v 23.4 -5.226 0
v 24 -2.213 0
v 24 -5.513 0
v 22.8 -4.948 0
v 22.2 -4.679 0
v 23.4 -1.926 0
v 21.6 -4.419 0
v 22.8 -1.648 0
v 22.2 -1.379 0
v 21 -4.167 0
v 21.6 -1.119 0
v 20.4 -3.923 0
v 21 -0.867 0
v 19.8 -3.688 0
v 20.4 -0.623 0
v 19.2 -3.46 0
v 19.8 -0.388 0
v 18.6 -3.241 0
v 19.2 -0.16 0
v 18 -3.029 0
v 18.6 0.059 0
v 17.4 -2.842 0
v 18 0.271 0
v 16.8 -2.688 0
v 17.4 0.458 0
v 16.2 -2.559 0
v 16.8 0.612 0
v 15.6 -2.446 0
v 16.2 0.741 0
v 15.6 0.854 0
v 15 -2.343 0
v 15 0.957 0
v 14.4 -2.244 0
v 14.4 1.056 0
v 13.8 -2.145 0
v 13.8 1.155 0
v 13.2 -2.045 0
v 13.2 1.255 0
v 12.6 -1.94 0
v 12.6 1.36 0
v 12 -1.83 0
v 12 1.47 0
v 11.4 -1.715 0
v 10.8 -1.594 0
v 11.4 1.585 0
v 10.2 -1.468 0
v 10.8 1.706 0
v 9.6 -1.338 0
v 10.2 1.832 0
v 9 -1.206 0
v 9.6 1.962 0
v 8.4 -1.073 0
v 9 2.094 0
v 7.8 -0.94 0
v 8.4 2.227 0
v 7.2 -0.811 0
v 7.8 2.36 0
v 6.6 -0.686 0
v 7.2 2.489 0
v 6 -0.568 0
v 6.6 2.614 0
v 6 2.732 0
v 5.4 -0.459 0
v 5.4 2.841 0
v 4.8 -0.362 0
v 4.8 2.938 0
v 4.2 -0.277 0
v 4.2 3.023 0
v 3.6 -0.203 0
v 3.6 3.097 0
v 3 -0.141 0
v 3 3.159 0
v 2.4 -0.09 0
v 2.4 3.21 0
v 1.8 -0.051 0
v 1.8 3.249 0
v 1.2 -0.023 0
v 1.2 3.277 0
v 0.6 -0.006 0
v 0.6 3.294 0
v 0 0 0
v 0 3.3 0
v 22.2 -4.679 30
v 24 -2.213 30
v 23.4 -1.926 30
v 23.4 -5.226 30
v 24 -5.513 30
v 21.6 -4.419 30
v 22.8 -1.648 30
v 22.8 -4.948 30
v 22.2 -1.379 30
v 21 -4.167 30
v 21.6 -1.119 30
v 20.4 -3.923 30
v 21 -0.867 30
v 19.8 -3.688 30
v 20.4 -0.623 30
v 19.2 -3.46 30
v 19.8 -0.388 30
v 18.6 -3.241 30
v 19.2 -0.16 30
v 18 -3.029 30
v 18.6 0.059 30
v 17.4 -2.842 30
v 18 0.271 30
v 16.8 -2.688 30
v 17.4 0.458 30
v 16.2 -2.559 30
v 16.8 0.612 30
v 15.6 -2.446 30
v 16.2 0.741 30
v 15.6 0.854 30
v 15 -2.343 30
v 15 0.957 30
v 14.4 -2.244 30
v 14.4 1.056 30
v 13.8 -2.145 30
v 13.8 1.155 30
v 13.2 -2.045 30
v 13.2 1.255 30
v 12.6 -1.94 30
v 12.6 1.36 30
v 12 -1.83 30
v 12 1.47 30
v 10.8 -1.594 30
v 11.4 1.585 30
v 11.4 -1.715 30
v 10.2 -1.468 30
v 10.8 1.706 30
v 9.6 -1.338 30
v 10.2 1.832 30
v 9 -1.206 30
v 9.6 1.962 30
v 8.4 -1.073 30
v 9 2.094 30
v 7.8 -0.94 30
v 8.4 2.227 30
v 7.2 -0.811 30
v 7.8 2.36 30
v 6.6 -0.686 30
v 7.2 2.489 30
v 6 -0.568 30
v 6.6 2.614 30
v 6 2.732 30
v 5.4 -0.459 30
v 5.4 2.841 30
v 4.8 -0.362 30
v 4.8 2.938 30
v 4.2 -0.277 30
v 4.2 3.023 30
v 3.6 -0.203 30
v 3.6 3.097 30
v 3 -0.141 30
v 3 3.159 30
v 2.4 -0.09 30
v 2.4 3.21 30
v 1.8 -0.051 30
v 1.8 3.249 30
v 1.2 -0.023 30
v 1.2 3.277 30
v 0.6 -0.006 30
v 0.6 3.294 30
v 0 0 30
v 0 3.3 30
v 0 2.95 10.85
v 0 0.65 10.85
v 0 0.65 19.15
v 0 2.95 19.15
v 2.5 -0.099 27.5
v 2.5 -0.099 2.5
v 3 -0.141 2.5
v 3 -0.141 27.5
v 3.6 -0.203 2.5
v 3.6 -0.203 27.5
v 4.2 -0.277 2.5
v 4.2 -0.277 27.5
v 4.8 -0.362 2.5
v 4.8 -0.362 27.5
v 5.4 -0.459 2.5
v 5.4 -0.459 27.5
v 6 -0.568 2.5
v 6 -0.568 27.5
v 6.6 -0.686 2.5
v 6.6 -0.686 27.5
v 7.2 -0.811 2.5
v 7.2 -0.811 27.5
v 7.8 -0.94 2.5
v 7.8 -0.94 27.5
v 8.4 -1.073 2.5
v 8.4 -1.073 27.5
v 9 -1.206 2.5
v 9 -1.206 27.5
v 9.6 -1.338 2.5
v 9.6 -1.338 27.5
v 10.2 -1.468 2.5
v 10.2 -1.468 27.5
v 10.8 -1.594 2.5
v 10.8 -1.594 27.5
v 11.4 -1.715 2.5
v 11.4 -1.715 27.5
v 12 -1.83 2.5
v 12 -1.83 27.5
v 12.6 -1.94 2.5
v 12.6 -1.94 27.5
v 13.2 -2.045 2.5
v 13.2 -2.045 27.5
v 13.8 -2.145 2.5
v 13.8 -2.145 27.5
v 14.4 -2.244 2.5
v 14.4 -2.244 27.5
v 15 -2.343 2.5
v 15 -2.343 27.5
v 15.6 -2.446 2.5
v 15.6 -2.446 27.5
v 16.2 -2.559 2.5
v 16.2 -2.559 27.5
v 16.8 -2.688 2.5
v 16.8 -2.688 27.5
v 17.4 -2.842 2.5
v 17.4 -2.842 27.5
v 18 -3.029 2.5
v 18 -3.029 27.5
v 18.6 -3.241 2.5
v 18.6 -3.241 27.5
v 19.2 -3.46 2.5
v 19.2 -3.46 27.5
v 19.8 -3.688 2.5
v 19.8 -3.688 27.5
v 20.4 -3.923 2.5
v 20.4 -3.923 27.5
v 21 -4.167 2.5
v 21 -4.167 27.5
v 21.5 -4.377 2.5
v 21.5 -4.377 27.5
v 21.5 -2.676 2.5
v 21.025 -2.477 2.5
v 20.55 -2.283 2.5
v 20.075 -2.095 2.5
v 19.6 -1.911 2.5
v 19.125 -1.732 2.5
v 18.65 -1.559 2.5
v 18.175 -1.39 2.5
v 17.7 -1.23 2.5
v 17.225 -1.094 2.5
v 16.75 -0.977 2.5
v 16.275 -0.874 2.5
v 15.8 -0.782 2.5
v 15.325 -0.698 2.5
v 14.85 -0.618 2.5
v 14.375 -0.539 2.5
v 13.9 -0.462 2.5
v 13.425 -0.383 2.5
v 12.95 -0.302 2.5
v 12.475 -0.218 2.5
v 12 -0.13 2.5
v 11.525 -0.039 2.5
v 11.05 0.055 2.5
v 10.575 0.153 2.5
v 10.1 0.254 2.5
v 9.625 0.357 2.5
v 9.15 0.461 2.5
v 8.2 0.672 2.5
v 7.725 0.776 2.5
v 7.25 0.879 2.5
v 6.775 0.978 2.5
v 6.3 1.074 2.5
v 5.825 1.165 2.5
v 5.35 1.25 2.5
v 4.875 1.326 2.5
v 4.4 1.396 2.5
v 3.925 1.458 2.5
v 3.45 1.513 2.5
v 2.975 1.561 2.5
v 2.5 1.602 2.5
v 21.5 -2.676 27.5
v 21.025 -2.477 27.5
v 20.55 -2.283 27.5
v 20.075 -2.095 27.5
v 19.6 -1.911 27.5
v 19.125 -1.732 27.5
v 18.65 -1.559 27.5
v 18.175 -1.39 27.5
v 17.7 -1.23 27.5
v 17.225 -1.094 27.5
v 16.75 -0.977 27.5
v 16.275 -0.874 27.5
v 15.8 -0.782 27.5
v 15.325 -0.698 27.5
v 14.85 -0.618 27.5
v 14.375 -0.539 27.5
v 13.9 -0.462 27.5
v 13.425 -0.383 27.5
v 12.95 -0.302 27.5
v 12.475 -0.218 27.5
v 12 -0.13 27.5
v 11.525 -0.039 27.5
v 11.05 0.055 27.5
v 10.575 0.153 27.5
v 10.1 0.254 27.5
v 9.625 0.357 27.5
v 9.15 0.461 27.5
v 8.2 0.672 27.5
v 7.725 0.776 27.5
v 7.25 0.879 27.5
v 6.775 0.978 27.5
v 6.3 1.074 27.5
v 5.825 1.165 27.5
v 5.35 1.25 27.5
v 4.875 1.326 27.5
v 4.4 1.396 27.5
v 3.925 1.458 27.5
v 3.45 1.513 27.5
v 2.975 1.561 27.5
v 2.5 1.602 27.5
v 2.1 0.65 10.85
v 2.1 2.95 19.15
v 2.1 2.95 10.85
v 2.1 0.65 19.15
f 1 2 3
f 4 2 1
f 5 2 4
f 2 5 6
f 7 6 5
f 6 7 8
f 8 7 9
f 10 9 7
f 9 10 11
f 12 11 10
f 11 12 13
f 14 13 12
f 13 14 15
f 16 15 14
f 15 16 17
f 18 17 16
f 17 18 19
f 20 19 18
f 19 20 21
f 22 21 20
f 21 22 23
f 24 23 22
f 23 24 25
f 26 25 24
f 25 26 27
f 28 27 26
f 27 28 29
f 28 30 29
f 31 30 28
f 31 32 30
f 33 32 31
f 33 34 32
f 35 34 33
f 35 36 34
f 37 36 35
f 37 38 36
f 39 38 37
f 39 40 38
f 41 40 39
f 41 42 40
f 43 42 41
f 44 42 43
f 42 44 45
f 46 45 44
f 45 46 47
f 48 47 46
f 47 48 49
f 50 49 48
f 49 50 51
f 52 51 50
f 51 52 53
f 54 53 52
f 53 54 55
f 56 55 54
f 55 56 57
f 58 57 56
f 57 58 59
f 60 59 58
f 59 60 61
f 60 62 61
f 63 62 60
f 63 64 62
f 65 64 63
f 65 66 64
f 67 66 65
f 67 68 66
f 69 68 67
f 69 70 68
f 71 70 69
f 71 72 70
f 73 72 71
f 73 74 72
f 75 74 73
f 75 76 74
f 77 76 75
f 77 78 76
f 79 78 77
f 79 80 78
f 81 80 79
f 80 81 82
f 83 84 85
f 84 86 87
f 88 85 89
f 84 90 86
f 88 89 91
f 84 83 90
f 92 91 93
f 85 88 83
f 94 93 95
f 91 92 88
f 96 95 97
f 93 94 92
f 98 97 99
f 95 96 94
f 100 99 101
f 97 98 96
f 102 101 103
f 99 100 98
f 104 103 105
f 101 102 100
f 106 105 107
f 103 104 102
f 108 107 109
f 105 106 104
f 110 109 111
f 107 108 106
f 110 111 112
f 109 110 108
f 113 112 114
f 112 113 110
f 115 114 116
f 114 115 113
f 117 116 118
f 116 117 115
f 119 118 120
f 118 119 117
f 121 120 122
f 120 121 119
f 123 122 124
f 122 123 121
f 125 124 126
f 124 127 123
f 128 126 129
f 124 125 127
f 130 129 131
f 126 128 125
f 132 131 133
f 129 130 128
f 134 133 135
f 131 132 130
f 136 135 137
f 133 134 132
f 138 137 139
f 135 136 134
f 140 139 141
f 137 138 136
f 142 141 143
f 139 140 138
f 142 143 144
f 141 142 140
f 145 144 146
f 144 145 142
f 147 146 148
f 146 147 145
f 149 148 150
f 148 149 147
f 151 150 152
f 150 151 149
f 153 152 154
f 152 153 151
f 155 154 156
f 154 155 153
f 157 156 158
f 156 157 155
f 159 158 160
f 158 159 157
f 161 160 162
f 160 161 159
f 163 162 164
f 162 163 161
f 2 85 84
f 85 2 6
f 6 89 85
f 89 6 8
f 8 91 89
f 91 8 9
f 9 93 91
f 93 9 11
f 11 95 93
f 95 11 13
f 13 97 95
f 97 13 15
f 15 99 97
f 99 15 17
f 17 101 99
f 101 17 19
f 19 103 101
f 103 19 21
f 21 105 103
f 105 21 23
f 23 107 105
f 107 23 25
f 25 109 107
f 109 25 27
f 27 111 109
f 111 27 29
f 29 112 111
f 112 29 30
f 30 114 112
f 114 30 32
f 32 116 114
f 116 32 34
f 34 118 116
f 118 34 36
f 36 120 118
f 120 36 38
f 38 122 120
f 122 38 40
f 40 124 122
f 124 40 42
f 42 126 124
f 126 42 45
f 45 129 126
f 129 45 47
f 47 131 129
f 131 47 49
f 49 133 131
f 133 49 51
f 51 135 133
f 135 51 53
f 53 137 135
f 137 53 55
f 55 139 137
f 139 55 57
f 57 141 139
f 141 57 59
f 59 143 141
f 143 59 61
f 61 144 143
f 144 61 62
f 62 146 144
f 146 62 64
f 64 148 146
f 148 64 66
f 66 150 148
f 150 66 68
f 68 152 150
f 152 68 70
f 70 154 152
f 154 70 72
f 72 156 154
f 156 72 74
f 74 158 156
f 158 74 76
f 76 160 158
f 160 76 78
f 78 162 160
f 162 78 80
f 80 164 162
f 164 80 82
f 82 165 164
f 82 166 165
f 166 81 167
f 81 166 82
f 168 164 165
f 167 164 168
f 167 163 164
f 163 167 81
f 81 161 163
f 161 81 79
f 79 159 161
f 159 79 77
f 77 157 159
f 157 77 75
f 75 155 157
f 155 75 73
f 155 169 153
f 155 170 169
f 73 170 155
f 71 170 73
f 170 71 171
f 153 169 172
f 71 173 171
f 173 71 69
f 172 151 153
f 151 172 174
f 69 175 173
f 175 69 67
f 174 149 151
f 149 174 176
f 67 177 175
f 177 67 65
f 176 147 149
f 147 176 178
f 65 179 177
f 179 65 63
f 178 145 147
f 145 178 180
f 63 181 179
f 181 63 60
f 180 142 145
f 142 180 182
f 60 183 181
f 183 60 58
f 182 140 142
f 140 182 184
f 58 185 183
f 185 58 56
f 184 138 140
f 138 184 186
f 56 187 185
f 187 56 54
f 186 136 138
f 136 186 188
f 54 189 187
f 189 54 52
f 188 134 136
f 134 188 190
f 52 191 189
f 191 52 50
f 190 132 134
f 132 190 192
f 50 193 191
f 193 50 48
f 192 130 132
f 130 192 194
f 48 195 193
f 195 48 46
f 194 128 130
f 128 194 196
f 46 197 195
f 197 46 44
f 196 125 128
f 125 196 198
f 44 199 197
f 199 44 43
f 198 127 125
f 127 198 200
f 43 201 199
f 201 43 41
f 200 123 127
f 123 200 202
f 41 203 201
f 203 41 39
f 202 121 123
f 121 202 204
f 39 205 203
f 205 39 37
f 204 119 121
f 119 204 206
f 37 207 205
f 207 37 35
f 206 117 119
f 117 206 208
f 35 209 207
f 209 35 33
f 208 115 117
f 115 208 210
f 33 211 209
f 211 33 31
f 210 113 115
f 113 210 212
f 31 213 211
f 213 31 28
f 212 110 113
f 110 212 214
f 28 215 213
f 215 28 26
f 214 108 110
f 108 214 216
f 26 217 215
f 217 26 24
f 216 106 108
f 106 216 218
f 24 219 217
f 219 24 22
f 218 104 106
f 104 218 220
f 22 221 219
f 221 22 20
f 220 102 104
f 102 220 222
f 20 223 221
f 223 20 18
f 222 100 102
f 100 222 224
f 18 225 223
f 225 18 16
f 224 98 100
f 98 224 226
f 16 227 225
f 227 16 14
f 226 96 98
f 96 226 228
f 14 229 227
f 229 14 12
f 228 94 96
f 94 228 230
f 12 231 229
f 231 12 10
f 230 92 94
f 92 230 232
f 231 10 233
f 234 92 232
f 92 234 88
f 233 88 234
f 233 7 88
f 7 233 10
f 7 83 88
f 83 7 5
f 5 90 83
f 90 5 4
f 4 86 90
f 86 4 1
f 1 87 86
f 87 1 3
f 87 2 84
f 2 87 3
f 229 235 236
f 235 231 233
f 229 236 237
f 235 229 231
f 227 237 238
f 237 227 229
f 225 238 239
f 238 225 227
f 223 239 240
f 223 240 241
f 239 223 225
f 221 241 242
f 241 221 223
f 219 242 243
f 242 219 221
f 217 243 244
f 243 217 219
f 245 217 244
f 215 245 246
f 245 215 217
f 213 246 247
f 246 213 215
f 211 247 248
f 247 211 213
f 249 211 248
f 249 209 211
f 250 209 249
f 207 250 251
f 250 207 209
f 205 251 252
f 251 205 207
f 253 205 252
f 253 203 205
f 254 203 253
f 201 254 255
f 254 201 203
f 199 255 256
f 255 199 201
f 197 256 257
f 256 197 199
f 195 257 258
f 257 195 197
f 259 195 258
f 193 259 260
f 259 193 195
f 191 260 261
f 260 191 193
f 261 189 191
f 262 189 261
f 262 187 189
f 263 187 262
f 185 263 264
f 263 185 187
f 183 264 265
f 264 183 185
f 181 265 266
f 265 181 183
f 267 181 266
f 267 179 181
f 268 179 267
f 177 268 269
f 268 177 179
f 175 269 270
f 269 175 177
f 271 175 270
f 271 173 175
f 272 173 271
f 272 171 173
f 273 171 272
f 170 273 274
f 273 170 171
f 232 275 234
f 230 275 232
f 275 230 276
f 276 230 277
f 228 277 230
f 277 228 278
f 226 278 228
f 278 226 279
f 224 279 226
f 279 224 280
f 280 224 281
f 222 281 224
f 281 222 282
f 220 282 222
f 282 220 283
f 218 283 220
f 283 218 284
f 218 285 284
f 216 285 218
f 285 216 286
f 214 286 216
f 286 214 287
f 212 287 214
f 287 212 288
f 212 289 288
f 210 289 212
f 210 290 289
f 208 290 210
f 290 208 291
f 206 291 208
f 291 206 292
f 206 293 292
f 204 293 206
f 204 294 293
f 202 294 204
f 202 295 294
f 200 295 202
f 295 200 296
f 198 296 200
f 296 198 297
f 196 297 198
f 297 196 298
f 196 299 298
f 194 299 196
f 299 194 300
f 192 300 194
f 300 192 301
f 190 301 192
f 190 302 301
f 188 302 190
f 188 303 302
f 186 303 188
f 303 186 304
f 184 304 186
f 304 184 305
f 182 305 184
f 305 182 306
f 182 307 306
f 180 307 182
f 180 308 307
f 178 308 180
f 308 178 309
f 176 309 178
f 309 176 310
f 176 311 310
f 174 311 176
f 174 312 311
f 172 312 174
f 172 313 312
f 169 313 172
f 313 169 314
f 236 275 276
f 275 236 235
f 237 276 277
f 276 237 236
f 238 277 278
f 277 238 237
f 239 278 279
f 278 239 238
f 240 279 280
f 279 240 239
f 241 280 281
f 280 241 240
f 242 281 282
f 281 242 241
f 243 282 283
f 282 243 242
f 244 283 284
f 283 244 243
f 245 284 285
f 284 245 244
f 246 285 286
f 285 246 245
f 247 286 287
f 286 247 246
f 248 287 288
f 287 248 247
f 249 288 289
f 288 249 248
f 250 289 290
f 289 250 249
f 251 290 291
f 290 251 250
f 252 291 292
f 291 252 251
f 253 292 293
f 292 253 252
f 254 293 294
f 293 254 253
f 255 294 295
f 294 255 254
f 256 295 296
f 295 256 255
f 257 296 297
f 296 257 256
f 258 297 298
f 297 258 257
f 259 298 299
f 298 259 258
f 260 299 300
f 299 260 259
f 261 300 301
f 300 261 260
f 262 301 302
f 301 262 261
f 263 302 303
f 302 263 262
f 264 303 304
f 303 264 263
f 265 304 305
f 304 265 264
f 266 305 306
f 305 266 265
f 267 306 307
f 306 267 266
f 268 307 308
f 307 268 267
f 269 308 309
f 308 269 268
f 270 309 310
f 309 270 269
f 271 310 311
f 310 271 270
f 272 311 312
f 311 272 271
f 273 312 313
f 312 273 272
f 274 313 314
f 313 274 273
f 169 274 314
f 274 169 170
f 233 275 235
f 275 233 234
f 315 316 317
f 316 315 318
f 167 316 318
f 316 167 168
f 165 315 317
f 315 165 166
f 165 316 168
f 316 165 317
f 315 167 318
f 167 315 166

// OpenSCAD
// ============================================================
// Wrist-conforming mount piece (independent of puck body)
// Sits on ONE side of the puck; print two, mirror for the other.
// The LRA window stays bare — this piece never covers it.
//
// Modeling axes (before you rotate for your own print orientation):
//   X = curve "run" from the puck-side edge (x=0) out to the
//       strap-side edge (x=mount_run)
//   Y = height/sag of the curve (this is the direction that
//       drops away from the puck as the piece follows the wrist)
//   Z = width along the wrist / strap direction (mount_length)
//
// Curve is a smooth blend of two circular arcs: tighter radius
// near the puck (r_inner), gentler radius near the strap edge
// (r_outer), blended over [blend_start, blend_end]. This is a
// single difference() between two well-conditioned (smooth,
// non-spiky) extruded solids -- not the multi-union pattern that
// broke CGAL on the cameo project, so no heightmap workaround
// should be needed here. Render-tested below.
// ============================================================

// ---------- PARAMETERS (mm) ----------------------------------
mount_run    = 24;   // curve profile length, puck-edge to strap-edge
mount_length = 30;   // width along the wrist (strap direction)

r_inner = 32;   // curvature radius near the puck edge (tighter)
r_outer = 55;   // curvature radius near the strap edge (gentler)
blend_start = 6;     // x where blend away from r_inner begins
blend_end   = 18;    // x where blend to r_outer completes

back_thickness = 1.6;   // solid backing thickness above the pocket floor (structural)
rim_width      = 2.5;   // solid rim border around the foam pocket (all sides)

foam_thickness = 2.0;   // target foam pad thickness (adjust once you've picked stock)
foam_proud     = 0.3;   // how far the foam should sit proud of the rim at rest
pocket_depth   = foam_thickness - foam_proud;  // recess cut UP from the rim plane for the foam

seg = 40;   // profile sample resolution
$fn = 60;

// ---------- CURVE MATH ----------------------------------------
function sag(x, r) = r - sqrt(max(r*r - x*x, 0));

function smoothstep(x, a, b) =
    let(t = min(max((x - a) / (b - a), 0), 1))
    t * t * (3 - 2 * t);

function sag_blend(x) =
    let(w = smoothstep(x, blend_start, blend_end))
    sag(x, r_inner) * (1 - w) + sag(x, r_outer) * w;

// skin-facing (bottom / rim) curve -- dips down (negative) as x grows
function z_bottom(x) = -sag_blend(x);
// pocket floor: recessed UP from the rim plane by pocket_depth
function z_floor(x) = z_bottom(x) + pocket_depth;
// outer back surface, above the floor by the structural backing
function shell_top_z(x) = z_floor(x) + back_thickness;

// ---------- 2D PROFILES -----------------------------------------
module shell_profile() {
    bottom_pts = [ for (i = [0:seg]) let(x = mount_run * i / seg) [x, z_bottom(x)] ];
    top_pts    = [ for (i = [seg:-1:0]) let(x = mount_run * i / seg) [x, shell_top_z(x)] ];
    polygon(concat(bottom_pts, top_pts));
}

// Cuts the pocket from the skin-facing (bottom) side up to the
// floor -- inset by rim_width in x so a solid rim survives all
// the way around. The -1 undercut guarantees the cut breaks
// cleanly through the bottom face rather than leaving a skin.
module pocket_profile() {
    x0 = rim_width;
    x1 = mount_run - rim_width;
    bottom_pts = [ for (i = [0:seg]) let(x = x0 + (x1 - x0) * i / seg) [x, z_bottom(x) - 1] ];
    top_pts    = [ for (i = [seg:-1:0]) let(x = x0 + (x1 - x0) * i / seg) [x, z_floor(x)] ];
    polygon(concat(bottom_pts, top_pts));
}

// ---------- 3D PIECE ---------------------------------------------
module mount_piece() {
    difference() {
        linear_extrude(height = mount_length)
            shell_profile();
        translate([0, 0, rim_width])
            linear_extrude(height = mount_length - 2 * rim_width)
                pocket_profile();
        key_slot_cutter();
    }
}

// ---------- REGISTRATION KEY SLOT ---------------------------------
// Matches the tongue on the puck's ±X wall (wrist_puck_enclosure
// KEY_* params). Cut from the puck-facing (x=0) edge, within the
// solid rim_width=2.5mm band -- i.e. before the foam pocket starts
// -- so it doesn't intrude on the pocket. See the puck file's KEY_*
// comment block for the shared-plane convention and the "first-pass,
// true up by hand" caveat; same applies here.
key_clearance = 0.3;   // loose dry-fit, not a press fit
key_depth = 1.8 + key_clearance;  // must match puck KEY_H + clearance
key_w     = 8.0 + key_clearance;  // must match puck KEY_W + clearance
key_t     = 2.0 + key_clearance;  // must match puck KEY_T + clearance
key_z     = 1.8;                  // must match puck KEY_Z

module key_slot_cutter() {
    // x = depth into the piece (undercut past x=0 so the cut
    //     breaks cleanly through the face rather than sitting
    //     tangent to it)
    // y = key_t  (mount piece's height/sag axis == puck's Z)
    // z = key_w  (mount piece's width axis == puck's Y)
    translate([(key_depth - 1) / 2, key_z, mount_length / 2])
        cube([key_depth + 1, key_t, key_w], center = true);
}

mount_piece();

// For the mirrored (opposite-side) piece:
// mirror([1, 0, 0]) mount_piece();
